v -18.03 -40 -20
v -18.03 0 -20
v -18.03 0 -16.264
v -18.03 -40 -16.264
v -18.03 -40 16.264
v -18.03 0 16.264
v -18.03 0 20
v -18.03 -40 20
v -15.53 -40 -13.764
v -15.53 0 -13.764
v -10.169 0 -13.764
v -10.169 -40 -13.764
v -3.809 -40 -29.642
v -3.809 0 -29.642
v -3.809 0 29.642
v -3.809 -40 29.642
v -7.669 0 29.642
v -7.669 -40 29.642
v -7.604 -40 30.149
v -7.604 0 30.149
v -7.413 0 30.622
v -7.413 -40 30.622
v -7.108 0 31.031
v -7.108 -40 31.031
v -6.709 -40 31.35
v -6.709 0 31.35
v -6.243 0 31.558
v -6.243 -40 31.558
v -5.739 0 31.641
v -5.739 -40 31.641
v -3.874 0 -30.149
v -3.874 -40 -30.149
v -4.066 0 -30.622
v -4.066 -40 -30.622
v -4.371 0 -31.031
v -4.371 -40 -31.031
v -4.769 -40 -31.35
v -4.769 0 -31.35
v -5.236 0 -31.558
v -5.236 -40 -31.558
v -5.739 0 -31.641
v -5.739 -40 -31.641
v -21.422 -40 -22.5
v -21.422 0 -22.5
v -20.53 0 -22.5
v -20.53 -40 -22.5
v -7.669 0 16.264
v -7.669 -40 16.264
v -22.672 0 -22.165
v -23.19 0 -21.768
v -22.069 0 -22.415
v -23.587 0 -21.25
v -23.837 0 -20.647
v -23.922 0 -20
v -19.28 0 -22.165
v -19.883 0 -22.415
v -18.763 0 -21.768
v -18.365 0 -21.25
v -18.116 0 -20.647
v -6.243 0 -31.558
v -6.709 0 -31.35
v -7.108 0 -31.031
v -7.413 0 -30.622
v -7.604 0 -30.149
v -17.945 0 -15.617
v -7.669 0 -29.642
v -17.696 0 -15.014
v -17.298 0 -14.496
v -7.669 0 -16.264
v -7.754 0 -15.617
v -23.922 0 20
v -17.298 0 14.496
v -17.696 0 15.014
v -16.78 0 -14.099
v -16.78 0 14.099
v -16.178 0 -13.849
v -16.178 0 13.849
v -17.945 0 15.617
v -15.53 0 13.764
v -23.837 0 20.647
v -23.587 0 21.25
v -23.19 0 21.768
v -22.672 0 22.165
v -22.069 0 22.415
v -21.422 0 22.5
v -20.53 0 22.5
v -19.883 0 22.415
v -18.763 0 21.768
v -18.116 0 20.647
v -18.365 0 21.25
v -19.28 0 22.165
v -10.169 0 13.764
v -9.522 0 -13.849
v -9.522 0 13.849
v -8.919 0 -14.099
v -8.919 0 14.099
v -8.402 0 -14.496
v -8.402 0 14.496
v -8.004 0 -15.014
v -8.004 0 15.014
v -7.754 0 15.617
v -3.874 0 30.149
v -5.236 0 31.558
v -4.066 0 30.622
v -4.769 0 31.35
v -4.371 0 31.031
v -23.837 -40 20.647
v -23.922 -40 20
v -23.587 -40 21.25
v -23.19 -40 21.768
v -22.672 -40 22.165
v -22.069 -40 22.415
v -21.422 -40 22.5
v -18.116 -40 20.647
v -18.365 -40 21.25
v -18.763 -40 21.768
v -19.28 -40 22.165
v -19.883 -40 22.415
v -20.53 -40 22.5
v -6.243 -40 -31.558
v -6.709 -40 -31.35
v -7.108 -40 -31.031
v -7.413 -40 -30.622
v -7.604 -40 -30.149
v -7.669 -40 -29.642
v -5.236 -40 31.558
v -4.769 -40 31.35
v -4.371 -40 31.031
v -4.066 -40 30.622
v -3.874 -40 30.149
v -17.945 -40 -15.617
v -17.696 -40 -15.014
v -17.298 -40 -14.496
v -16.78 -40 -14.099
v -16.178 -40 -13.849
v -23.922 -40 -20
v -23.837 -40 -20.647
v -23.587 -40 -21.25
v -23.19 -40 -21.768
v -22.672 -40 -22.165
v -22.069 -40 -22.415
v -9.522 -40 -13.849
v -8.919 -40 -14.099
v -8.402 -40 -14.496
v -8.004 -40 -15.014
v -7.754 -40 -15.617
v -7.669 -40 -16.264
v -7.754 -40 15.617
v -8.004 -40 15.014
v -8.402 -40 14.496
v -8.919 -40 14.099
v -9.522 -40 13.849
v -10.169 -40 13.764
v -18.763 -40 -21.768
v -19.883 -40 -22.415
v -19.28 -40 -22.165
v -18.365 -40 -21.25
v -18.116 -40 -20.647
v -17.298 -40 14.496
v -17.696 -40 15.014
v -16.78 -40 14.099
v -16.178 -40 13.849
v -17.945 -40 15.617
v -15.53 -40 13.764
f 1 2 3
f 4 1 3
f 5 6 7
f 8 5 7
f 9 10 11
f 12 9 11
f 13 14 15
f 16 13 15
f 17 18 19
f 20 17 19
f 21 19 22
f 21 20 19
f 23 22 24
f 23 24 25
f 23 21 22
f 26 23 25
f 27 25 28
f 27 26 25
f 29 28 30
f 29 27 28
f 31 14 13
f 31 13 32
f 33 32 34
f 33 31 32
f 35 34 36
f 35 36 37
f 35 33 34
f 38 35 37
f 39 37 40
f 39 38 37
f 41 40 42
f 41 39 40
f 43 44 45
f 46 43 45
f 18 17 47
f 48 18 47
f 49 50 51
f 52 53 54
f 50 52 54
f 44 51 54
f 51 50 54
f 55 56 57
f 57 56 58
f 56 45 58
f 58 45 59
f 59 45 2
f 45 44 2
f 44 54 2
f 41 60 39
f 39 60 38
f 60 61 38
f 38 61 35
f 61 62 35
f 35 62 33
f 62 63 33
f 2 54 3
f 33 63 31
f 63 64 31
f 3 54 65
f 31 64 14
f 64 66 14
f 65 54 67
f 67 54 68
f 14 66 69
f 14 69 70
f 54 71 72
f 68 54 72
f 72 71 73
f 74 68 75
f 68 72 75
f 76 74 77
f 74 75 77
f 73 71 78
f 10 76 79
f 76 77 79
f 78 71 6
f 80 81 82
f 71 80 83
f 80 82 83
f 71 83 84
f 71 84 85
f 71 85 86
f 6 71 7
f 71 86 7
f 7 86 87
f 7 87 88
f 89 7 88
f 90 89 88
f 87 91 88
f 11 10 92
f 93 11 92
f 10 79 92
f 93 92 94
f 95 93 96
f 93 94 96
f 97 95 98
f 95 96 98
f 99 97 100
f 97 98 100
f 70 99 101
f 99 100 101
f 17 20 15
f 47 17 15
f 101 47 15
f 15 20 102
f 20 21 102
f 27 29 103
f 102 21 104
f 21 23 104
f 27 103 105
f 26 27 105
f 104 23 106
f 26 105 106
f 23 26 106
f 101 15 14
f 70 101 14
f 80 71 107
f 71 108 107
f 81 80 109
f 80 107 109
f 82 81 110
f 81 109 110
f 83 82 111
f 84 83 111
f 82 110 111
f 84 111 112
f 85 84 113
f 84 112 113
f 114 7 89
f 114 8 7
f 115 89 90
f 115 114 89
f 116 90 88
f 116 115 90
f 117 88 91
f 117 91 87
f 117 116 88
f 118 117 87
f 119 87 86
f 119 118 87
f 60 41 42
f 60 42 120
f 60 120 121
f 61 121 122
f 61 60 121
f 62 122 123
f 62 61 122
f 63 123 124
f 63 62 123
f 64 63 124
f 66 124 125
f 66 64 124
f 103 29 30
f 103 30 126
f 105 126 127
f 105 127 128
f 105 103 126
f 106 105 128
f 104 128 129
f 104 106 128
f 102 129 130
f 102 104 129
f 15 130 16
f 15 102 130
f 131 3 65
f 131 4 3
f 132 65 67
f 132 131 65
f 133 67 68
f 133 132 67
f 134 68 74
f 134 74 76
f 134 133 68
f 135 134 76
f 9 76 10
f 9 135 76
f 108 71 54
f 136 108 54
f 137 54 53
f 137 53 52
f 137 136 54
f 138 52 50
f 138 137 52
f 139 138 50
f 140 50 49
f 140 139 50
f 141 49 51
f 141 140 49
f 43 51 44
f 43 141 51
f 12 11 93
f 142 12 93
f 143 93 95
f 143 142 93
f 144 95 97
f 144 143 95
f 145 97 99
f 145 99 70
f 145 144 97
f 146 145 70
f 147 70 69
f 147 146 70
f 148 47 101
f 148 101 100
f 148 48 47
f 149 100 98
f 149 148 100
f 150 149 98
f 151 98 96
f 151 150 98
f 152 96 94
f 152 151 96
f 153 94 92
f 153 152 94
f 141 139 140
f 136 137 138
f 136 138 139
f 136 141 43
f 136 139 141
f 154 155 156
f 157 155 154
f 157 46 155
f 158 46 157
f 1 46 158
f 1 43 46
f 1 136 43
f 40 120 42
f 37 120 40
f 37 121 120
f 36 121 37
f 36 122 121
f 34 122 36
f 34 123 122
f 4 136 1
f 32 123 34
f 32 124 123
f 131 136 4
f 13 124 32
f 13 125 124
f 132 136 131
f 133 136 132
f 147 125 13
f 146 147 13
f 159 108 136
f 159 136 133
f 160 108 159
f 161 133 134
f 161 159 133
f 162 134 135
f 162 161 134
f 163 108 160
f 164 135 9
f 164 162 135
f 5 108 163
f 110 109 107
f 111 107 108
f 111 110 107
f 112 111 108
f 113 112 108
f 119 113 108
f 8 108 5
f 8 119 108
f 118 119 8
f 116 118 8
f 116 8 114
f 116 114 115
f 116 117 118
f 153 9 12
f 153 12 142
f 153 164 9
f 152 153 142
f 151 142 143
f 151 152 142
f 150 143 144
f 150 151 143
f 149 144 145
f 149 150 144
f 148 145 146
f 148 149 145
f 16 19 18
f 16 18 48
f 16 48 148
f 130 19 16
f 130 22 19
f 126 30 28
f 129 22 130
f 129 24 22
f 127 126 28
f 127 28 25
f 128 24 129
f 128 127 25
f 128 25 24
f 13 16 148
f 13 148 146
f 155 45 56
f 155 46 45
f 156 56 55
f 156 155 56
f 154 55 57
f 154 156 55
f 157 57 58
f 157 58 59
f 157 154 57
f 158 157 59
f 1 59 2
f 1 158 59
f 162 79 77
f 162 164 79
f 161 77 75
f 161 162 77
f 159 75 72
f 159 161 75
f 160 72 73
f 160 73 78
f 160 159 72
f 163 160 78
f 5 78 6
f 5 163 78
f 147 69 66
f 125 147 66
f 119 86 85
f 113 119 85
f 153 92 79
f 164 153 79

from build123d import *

# Parameters (mm, degrees)
F1_DEPTH    = 40
F2_R        = 2.5
F3_T1_DEPTH = 50


# Not quite as in the source:
# - a fillet or chamfer that OpenCascade refuses, or shapes differently, is made with other operations: its cross-section is extruded or revolved along the edge and cut away or added


with BuildPart() as f1:
    # F0 (on Front) → F1 (new body)
    with BuildSketch(Plane.XZ):
        Polygon((-23.9221176861, 22.5), (-23.9221176861, 0), (-23.9221176861, -22.5), (-18.0304694658, -22.5), (-18.0304694658, -13.7641071746), (-7.6692953279, -13.7641071746), (-7.6692953279, -31.6422108453), (-3.809250768, -31.6422108453), (-3.809250768, 0), (-3.809250768, 31.6422108453), (-7.6692953279, 31.6422108453), (-7.6692953279, 13.7641071746), (-18.0304694658, 13.7641071746), (-18.0304694658, 22.5), align=None)
    extrude(amount=F1_DEPTH)

    # F2
    f2_edges = [f1.edges().sort_by_distance(p)[0] for p in [
        (-23.922118, -20, 22.5),
        (-18.030469, -20, 22.5),
        (-23.922118, -20, -22.5),
        (-18.030469, -20, -22.5),
        (-18.030469, -20, 13.764107),
        (-18.030469, -20, -13.764107),
        (-7.669295, -20, 13.764107),
        (-7.669295, -20, -13.764107),
    ]]
    fillet(f2_edges, radius=F2_R)

    # F3: fillet of radius 2 on 4 edges, made by hand

    # F3_s2 → F3_t1 (cut)
    with BuildSketch(Plane.XZ.offset(-5)):
        with BuildLine():
            ThreePointArc((-7.6692953279, 29.6422108453), (-7.0835088902, 31.0564244077), (-5.6692953279, 31.6422108453))
            Line((-5.6692953279, 31.6422108453), (-7.6692953279, 31.6422108453))
            Line((-7.6692953279, 31.6422108453), (-7.6692953279, 29.6422108453))
        make_face()
        with BuildLine():
            ThreePointArc((-5.809250768, 31.6422108453), (-4.3950372056, 31.0564244077), (-3.809250768, 29.6422108453))
            Line((-3.809250768, 29.6422108453), (-3.809250768, 31.6422108453))
            Line((-3.809250768, 31.6422108453), (-5.809250768, 31.6422108453))
        make_face()
        with BuildLine():
            ThreePointArc((-5.6692953279, -31.6422108453), (-7.0835088902, -31.0564244077), (-7.6692953279, -29.6422108453))
            Line((-7.6692953279, -29.6422108453), (-7.6692953279, -31.6422108453))
            Line((-7.6692953279, -31.6422108453), (-5.6692953279, -31.6422108453))
        make_face()
        with BuildLine():
            ThreePointArc((-3.809250768, -29.6422108453), (-4.3950372056, -31.0564244077), (-5.809250768, -31.6422108453))
            Line((-5.809250768, -31.6422108453), (-3.809250768, -31.6422108453))
            Line((-3.809250768, -31.6422108453), (-3.809250768, -29.6422108453))
        make_face()
    extrude(amount=F3_T1_DEPTH, mode=Mode.SUBTRACT)


solid = f1.part
